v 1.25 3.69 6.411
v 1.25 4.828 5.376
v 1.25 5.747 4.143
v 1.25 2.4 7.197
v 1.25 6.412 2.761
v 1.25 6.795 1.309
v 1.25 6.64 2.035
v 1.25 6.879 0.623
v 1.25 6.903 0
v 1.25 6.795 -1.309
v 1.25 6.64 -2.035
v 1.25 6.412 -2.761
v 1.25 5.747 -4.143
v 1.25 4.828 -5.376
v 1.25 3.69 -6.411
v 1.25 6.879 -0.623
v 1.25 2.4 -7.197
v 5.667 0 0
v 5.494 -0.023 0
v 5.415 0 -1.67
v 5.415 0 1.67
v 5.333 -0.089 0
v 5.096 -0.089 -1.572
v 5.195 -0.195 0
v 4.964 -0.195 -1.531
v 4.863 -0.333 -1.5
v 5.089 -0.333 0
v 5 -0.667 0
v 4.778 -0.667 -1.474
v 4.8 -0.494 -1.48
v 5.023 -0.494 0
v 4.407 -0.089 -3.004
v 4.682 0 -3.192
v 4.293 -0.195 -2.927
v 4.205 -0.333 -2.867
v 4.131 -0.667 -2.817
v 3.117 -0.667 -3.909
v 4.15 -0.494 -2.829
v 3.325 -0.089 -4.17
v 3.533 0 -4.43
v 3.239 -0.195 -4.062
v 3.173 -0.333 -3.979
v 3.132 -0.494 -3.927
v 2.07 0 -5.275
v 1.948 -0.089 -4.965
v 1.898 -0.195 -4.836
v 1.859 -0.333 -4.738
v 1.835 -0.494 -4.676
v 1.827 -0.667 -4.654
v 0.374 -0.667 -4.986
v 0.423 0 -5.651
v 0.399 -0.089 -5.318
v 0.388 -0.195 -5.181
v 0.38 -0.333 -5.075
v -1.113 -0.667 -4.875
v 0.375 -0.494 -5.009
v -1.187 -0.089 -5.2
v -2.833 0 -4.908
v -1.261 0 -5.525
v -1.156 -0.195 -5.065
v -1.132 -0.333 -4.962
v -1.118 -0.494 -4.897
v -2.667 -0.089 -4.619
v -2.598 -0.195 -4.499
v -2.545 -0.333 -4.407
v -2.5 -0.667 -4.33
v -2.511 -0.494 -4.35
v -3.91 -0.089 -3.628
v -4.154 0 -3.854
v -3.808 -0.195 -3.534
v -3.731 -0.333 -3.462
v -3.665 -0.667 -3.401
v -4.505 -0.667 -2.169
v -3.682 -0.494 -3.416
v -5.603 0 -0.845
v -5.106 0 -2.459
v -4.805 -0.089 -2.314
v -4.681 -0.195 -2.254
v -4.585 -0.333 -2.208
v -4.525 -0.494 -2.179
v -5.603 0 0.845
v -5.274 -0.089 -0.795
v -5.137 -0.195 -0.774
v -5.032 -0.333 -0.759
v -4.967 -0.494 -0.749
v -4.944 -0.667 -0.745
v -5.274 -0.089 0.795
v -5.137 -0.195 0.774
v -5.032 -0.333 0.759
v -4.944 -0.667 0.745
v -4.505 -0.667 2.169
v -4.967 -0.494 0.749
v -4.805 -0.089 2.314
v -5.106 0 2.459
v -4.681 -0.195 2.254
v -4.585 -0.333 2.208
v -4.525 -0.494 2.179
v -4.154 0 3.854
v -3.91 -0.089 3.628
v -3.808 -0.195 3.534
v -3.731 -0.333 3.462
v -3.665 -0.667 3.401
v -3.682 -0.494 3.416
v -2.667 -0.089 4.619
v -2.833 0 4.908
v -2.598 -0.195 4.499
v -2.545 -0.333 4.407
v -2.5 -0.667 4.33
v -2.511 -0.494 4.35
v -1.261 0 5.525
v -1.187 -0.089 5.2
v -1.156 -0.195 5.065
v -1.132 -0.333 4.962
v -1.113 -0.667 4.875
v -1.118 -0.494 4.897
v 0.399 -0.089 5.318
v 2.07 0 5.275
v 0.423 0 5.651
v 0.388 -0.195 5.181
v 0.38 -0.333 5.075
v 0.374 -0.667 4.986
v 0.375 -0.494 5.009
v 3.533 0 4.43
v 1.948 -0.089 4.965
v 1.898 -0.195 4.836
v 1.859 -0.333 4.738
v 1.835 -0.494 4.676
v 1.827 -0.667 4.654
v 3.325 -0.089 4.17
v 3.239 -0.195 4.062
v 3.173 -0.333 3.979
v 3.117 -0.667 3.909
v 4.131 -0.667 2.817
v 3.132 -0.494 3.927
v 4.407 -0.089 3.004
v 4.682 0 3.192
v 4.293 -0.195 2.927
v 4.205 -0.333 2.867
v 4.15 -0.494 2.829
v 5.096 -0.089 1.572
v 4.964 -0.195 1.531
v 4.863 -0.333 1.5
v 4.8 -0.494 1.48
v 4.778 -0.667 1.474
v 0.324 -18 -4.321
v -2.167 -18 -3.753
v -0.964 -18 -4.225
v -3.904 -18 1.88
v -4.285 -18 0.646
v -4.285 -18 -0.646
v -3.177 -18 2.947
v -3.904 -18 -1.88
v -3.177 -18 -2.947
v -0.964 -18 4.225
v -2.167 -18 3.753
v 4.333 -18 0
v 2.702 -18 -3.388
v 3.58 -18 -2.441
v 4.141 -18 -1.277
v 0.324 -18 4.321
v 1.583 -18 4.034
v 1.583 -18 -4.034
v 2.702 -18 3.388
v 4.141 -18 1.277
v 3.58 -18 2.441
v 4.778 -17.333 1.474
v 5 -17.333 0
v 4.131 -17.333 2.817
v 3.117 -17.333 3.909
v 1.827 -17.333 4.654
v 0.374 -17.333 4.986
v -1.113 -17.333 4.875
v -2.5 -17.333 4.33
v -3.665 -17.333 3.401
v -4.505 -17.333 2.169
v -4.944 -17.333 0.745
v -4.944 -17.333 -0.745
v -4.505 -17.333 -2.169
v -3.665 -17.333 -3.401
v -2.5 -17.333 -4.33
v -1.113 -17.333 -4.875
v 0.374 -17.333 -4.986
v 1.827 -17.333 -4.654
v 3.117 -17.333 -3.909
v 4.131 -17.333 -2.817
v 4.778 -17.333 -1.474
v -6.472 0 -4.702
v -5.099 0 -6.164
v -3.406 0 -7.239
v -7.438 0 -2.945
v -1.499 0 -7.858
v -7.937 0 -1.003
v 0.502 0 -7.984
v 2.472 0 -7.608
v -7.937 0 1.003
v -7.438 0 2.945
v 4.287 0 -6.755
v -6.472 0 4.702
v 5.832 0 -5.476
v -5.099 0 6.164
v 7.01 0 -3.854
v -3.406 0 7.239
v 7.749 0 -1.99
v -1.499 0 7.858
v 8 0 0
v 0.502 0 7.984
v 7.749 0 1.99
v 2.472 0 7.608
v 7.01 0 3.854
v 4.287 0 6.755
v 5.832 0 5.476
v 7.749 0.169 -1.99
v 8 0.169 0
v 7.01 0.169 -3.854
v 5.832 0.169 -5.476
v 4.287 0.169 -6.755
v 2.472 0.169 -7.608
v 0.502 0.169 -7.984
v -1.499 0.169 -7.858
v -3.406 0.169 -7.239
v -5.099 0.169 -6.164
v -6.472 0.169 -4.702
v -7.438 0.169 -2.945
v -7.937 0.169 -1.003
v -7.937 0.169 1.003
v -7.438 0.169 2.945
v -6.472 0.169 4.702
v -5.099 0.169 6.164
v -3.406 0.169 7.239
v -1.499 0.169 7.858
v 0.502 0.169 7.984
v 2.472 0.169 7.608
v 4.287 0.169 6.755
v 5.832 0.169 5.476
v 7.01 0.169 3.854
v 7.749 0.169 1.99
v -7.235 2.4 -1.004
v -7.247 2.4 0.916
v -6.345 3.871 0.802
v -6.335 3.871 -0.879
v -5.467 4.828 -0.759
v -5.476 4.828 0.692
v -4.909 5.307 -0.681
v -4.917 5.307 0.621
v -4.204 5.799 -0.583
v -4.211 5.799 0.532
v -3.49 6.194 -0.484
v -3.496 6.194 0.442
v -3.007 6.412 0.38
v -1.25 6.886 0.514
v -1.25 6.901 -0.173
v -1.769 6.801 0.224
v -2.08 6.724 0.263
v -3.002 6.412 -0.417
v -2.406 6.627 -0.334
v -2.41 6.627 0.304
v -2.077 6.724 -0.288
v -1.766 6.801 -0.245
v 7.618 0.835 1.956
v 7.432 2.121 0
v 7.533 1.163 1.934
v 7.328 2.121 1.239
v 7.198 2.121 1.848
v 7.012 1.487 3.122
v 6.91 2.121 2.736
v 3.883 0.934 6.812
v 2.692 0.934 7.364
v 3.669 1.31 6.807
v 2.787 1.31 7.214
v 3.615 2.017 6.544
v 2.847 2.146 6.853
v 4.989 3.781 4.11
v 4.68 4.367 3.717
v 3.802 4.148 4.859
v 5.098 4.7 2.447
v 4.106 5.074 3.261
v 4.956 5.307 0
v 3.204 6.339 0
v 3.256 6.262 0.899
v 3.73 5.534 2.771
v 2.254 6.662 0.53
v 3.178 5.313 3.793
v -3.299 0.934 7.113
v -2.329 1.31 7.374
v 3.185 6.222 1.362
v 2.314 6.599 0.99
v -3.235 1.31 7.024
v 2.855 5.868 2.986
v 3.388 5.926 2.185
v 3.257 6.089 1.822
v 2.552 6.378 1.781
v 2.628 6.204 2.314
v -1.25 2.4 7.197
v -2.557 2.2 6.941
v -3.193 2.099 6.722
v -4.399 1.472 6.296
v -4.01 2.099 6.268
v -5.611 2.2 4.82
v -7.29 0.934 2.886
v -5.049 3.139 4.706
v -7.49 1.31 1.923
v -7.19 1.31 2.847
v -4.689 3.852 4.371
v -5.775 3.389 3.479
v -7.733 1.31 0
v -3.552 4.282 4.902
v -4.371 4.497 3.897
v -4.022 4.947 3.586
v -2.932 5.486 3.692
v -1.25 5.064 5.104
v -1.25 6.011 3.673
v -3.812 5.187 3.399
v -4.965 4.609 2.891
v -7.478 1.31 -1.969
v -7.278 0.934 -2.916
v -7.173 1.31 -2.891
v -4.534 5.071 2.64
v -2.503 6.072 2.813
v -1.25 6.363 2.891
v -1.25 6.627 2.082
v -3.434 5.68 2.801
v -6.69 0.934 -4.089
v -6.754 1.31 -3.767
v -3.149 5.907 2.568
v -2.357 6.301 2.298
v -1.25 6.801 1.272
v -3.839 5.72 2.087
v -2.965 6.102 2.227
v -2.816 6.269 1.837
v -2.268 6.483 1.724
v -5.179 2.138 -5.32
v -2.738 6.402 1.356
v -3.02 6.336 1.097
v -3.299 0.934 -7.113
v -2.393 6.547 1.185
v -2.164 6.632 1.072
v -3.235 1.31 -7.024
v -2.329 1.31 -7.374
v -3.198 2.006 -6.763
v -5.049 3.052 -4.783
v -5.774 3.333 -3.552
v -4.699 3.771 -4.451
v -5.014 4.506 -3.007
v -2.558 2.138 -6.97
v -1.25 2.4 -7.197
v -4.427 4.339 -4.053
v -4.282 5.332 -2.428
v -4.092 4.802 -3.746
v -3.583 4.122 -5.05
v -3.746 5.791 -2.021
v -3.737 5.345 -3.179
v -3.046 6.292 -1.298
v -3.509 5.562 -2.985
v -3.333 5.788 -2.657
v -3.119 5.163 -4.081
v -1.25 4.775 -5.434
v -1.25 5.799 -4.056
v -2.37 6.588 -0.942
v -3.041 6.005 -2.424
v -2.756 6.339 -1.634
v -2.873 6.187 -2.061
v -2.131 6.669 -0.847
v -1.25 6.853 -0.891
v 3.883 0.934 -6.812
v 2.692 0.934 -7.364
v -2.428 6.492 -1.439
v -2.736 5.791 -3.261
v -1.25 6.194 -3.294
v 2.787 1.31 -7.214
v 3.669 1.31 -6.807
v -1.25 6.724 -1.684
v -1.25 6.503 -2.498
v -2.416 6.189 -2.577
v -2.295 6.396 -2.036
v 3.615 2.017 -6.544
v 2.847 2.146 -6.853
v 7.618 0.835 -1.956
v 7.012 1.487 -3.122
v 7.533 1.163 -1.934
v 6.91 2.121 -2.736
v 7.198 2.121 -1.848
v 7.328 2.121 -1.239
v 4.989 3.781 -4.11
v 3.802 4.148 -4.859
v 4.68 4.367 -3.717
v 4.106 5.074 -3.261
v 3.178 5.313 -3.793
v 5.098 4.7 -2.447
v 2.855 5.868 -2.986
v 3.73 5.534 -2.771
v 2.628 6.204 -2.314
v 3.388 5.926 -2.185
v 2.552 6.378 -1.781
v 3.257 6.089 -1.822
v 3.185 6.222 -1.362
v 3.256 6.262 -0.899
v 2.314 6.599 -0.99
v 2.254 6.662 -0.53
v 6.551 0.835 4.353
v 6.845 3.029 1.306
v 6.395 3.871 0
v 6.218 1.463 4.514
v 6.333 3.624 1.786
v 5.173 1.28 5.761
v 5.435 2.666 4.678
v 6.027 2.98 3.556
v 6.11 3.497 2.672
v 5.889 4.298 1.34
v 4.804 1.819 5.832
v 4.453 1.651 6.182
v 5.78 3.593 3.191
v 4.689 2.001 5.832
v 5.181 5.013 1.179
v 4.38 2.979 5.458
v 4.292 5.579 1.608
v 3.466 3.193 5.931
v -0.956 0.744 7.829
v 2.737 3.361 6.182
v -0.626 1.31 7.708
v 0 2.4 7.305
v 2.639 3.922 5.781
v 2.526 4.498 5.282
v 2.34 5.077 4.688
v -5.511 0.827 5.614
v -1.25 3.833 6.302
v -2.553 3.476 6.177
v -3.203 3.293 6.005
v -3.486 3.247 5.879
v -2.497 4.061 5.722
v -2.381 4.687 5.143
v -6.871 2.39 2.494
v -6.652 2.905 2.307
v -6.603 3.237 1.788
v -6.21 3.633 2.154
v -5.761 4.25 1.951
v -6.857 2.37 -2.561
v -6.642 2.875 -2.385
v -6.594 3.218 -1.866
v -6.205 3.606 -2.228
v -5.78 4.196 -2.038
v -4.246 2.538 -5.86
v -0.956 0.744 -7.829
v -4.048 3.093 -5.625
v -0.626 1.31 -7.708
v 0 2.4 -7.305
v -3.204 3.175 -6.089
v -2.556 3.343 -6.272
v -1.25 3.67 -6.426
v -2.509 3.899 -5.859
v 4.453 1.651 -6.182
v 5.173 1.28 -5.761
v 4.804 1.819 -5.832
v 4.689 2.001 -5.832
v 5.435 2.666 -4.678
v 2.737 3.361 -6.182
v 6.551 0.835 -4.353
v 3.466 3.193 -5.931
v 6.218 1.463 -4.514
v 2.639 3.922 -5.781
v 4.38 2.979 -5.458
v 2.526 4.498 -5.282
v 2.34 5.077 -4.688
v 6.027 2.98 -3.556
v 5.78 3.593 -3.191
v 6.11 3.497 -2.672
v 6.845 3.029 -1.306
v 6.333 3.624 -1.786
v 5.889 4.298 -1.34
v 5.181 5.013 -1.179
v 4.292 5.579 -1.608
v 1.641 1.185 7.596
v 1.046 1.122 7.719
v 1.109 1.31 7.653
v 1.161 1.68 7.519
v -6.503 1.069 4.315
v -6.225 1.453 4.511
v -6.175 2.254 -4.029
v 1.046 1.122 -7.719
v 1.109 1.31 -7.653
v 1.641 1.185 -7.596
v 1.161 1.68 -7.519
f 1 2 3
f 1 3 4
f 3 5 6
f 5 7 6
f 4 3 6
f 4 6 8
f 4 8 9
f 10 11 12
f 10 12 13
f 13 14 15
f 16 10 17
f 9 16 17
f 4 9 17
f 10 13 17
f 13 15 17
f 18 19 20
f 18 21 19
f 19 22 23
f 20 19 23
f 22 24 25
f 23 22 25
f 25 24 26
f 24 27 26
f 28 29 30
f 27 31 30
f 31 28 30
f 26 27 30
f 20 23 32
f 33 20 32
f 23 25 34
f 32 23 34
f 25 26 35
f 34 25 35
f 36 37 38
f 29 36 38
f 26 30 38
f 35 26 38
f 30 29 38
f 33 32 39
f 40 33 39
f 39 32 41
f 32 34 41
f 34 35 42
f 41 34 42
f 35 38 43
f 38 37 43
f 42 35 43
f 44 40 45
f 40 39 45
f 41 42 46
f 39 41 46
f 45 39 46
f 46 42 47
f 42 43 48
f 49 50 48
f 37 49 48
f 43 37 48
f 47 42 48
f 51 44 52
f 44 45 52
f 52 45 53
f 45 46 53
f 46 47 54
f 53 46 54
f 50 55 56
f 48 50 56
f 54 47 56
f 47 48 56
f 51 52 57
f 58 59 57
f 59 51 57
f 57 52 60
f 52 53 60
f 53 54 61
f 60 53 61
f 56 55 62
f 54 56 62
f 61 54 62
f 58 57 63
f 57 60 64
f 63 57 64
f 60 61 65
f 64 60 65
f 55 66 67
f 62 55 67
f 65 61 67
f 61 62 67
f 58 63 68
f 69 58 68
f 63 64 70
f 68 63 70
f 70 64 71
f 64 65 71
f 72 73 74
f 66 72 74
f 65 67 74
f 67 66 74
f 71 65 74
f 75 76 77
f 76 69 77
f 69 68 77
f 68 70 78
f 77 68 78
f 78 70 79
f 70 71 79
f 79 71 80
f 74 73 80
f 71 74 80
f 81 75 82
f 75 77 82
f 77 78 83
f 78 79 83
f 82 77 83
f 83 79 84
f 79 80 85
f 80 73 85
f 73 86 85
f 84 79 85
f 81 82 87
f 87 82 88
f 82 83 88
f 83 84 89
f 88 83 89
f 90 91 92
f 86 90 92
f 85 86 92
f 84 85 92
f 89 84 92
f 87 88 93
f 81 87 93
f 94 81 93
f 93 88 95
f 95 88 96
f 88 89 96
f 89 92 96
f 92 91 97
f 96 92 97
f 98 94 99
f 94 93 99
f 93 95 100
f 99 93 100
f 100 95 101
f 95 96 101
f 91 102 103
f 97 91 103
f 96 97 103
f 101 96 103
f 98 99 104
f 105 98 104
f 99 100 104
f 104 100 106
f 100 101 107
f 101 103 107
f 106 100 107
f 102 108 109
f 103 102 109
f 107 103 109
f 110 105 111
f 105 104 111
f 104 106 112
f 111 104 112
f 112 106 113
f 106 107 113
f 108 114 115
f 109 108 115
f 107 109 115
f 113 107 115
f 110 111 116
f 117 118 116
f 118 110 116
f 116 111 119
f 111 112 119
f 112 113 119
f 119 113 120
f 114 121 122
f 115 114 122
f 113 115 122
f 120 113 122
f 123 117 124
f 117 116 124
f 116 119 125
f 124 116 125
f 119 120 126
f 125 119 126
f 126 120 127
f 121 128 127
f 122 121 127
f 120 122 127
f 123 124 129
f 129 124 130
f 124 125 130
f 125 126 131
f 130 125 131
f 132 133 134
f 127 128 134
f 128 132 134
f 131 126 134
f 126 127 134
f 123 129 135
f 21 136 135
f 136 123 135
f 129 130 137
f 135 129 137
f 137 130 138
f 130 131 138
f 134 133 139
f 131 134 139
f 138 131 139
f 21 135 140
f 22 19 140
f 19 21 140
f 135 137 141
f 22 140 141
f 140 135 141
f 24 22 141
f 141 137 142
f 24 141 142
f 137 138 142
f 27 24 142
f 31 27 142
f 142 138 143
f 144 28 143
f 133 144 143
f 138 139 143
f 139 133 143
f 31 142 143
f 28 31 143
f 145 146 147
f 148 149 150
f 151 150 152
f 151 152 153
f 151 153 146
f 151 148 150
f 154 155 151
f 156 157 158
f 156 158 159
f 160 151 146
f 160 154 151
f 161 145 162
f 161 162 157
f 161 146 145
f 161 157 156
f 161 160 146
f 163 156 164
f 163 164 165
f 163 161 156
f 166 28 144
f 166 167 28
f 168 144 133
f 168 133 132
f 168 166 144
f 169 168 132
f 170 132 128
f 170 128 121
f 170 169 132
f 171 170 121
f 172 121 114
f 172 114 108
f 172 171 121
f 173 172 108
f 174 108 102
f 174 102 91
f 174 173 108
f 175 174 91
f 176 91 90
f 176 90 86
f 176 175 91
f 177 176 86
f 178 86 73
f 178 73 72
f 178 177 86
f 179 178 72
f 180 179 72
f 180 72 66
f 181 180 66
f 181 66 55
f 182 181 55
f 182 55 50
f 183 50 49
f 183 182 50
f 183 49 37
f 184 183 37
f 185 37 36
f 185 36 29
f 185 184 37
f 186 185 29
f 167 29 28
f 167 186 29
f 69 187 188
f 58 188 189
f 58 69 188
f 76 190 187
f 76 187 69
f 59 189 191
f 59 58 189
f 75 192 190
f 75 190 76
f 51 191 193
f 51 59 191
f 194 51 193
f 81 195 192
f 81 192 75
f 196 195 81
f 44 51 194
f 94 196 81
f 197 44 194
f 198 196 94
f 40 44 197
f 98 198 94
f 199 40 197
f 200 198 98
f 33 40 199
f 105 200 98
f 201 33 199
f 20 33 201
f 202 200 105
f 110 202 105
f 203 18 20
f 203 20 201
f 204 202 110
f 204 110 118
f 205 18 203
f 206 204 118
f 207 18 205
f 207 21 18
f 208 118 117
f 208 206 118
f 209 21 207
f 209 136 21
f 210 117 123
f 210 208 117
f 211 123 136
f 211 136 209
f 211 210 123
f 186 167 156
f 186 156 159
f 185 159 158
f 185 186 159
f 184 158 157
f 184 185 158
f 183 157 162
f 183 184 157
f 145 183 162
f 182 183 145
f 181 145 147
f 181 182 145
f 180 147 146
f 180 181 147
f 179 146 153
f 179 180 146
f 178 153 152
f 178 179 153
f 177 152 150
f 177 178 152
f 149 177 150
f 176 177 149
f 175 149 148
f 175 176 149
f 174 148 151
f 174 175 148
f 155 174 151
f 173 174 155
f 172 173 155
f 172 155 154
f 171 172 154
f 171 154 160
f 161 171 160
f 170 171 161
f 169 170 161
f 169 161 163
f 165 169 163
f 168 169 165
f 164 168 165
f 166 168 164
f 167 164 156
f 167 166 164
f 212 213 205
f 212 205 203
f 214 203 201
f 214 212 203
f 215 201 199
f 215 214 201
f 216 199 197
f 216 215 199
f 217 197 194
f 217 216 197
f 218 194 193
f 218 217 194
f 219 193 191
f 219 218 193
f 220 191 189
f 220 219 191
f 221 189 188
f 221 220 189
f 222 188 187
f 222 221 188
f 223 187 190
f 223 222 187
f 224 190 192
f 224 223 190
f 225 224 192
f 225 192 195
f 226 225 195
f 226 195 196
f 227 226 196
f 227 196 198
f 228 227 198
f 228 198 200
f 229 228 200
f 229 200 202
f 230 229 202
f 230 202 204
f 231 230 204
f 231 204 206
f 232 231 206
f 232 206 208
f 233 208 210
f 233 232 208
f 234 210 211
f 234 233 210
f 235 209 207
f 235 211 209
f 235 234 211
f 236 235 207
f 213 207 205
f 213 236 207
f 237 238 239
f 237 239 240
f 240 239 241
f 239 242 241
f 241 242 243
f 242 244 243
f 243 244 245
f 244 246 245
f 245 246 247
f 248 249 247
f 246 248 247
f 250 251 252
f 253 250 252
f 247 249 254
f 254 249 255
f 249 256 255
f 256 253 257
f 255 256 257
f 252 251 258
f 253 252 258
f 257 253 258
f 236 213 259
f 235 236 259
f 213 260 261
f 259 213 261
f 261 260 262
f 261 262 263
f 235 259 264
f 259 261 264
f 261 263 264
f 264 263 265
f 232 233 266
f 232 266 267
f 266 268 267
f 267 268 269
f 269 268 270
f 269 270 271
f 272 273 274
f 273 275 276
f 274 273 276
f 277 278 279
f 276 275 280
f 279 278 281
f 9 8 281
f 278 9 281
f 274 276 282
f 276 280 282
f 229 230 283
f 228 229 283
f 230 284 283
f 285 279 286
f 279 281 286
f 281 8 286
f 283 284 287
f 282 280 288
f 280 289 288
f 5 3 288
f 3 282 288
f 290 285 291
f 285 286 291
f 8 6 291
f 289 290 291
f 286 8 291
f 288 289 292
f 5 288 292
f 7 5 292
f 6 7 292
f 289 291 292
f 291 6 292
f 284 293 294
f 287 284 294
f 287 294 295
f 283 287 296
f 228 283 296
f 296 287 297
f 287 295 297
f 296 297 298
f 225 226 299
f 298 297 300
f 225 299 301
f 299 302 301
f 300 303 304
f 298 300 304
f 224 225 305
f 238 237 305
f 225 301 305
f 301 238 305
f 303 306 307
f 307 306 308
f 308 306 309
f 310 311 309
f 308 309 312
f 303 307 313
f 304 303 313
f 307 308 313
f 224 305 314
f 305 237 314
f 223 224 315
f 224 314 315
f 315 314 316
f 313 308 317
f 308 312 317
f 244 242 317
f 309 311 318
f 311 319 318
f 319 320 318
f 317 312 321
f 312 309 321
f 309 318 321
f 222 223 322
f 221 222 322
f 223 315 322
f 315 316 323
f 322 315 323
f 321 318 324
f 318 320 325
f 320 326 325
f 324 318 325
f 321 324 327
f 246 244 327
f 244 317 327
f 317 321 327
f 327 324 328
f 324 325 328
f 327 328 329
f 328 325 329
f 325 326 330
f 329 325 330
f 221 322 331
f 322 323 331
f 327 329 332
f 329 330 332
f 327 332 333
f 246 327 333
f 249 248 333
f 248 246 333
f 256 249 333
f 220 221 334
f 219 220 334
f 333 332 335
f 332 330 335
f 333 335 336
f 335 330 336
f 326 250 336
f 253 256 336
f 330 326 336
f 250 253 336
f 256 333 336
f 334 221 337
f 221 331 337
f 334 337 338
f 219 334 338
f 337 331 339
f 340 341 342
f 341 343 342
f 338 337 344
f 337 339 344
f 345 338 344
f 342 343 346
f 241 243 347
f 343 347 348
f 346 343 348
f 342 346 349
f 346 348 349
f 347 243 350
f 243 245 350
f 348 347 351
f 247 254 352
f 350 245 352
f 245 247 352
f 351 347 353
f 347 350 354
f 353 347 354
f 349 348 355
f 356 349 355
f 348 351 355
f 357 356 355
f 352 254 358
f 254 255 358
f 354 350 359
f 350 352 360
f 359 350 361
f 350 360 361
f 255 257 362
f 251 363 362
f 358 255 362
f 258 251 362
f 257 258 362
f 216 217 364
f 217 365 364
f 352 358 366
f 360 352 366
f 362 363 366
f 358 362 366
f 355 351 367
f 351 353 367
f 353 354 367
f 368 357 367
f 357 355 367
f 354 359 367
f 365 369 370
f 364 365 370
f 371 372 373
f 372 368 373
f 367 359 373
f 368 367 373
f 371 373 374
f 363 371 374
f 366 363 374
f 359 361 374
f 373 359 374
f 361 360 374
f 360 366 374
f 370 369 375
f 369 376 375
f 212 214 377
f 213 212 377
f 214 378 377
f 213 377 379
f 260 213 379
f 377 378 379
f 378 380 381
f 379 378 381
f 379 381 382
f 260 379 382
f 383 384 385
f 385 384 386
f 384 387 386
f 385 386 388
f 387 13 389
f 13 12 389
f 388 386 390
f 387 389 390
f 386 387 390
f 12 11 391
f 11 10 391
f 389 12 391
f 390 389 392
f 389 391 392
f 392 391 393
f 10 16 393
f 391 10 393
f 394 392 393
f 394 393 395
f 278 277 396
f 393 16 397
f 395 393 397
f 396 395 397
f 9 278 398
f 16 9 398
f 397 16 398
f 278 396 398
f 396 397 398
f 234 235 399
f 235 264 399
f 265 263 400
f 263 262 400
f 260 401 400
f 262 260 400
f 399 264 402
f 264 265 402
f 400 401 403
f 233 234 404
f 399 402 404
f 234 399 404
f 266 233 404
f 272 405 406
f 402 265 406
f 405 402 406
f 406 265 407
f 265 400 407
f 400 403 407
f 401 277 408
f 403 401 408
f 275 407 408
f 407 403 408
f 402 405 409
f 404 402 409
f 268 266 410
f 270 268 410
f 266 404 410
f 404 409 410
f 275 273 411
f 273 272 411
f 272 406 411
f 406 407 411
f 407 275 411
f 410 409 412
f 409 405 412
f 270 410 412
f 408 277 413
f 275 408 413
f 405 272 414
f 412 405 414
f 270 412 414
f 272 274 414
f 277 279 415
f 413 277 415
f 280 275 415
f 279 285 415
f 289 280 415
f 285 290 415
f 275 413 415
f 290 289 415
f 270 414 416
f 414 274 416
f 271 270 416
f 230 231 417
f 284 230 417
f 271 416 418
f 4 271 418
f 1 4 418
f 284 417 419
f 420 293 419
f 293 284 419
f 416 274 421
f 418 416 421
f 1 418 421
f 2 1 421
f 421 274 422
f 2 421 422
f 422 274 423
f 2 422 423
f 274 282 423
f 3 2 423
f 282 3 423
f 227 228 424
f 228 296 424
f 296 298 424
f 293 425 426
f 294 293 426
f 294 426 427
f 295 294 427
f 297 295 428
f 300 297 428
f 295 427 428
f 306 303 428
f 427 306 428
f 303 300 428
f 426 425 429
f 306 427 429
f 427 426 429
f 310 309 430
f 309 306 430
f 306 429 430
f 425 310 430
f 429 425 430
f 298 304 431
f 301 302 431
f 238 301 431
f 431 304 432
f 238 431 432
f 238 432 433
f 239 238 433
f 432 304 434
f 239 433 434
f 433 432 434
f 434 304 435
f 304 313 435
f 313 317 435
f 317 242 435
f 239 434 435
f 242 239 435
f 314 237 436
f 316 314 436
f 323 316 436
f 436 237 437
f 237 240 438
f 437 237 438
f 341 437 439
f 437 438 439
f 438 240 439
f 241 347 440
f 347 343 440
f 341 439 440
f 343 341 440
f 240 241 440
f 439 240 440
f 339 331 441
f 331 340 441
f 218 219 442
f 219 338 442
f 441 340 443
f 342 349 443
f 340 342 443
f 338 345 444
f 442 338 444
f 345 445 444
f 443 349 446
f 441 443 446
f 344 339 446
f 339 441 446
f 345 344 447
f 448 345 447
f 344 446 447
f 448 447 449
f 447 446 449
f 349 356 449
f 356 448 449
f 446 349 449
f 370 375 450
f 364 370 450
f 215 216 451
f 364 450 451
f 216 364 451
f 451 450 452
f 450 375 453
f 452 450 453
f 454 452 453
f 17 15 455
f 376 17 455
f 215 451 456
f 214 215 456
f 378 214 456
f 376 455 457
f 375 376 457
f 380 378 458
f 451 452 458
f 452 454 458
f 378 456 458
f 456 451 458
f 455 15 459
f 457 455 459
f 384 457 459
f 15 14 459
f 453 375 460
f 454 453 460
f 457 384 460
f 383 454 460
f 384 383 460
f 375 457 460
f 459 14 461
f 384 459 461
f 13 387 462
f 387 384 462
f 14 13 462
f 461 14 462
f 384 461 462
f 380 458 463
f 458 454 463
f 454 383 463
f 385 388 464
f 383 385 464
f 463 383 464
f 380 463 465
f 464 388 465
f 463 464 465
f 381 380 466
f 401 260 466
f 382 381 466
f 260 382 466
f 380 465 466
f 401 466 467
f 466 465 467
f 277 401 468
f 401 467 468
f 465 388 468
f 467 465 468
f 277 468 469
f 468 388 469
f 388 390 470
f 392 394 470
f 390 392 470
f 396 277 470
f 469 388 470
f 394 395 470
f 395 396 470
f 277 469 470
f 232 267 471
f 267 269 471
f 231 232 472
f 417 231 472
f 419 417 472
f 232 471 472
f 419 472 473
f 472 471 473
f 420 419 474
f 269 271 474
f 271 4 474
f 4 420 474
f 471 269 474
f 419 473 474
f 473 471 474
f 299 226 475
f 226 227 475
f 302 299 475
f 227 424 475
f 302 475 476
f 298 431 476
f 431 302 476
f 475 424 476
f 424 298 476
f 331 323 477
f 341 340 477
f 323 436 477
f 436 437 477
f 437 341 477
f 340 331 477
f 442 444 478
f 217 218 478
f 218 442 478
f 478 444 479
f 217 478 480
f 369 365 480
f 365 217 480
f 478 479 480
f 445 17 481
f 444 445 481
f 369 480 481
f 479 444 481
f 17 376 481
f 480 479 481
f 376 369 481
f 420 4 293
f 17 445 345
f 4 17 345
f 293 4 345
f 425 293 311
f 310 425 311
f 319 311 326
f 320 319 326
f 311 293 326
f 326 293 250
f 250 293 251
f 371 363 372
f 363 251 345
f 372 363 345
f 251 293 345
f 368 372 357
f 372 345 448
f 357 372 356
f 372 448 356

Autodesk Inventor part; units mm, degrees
ref_plane "YZ Plane" through (0, 0, 0) normal (1, 0, 0) x (0, 1, 0)
ref_plane "XZ Plane" through (0, 0, 0) normal (0, 1, 0) x (-1, 0, 0)
ref_plane "XY Plane" through (0, 0, 0) normal (0, 0, 1) x (1, 0, 0)
sketch "Sketch1" plane through (0, 0, 0) normal (0, 0, 1) x (1, 0, 0)
  line L0 (0, 7) -> (0, -18)
  line L1 (0, 0) -> (8, 0) construction
  arc A0 (8, 0.1689) -> (0, 7) centre (0, -1.1) ccw
  line L2 (8, 0) -> (5, 0)
  line L3 (5, 0) -> (5, -18)
  line L4 (5, -18) -> (0, -18)
  line L5 (8, 0) -> (8, 0.1689)
  dimension "d1" = 7
  dimension "d2" = 8.1
  dimension "d3" = 10
  dimension "d4" = 18
  dimension "d25" = 16
revolve "Вращение1" add sketch "Sketch1" angle 360 about axis through (0, 7, 0) along (0, -1, 0)
sketch "Sketch2" plane through (0, 0, 0) normal (0, 0, 1) x (1, 0, 0)
  line L0 (-1.25, 7) -> (1.25, 7)
  line L1 (1.25, 7) -> (1.25, 2.4)
  line L2 (1.25, 2.4) -> (-1.25, 2.4)
  line L3 (-1.25, 2.4) -> (-1.25, 7)
  line L4 (0, 0) -> (0, 7)
  arc A0 (8, 0.1689) -> (-8, 0.1689) centre (0, -1.1) ccw construction
  dimension "d6" = 2.4
  dimension "d7" = 2.5
extrude "Выдавливание1" cut sketch "Sketch2" along normal through all both and the other way through all
thread "Резьба1" size "M10x1.5" class "6g" standard "ISO Metric profile" length 18
fillet "Сопряжение1" radius 0.6667 1 edges at (-5, 0, 0)
chamfer "Фаска1" distance 0.6667 angle 45 1 edges at (-5, -18, 0)
equation "\"d6\" = w"
equation "\"d7\" = n"
equation "\"d10\" = b"
equation "\"d12\" = c_"
equation "\"d13\" = c_"
equation "\"d1\" = k"
equation "\"d2\" = R1"
equation "\"d3\" = d_"
equation "\"d4\" = l_"
equation "\"d25\" = D"
equation "\"d_\" = 10"
equation "\"D\" = 16"
equation "\"k\" = 7"
equation "\"l_\" = 18"
equation "\"b\" = 18"
equation "\"n\" = 2.5"
equation "\"w\" = 2.4"
equation "\"c_\" = 0.0666667 * d_"
equation "\"R1\" = 8.1"
equation "\"G\" = 0"
properties part number "Винт A.M10-6gx18 ГОСТ 17473-80" material "Сталь, мягкая"
